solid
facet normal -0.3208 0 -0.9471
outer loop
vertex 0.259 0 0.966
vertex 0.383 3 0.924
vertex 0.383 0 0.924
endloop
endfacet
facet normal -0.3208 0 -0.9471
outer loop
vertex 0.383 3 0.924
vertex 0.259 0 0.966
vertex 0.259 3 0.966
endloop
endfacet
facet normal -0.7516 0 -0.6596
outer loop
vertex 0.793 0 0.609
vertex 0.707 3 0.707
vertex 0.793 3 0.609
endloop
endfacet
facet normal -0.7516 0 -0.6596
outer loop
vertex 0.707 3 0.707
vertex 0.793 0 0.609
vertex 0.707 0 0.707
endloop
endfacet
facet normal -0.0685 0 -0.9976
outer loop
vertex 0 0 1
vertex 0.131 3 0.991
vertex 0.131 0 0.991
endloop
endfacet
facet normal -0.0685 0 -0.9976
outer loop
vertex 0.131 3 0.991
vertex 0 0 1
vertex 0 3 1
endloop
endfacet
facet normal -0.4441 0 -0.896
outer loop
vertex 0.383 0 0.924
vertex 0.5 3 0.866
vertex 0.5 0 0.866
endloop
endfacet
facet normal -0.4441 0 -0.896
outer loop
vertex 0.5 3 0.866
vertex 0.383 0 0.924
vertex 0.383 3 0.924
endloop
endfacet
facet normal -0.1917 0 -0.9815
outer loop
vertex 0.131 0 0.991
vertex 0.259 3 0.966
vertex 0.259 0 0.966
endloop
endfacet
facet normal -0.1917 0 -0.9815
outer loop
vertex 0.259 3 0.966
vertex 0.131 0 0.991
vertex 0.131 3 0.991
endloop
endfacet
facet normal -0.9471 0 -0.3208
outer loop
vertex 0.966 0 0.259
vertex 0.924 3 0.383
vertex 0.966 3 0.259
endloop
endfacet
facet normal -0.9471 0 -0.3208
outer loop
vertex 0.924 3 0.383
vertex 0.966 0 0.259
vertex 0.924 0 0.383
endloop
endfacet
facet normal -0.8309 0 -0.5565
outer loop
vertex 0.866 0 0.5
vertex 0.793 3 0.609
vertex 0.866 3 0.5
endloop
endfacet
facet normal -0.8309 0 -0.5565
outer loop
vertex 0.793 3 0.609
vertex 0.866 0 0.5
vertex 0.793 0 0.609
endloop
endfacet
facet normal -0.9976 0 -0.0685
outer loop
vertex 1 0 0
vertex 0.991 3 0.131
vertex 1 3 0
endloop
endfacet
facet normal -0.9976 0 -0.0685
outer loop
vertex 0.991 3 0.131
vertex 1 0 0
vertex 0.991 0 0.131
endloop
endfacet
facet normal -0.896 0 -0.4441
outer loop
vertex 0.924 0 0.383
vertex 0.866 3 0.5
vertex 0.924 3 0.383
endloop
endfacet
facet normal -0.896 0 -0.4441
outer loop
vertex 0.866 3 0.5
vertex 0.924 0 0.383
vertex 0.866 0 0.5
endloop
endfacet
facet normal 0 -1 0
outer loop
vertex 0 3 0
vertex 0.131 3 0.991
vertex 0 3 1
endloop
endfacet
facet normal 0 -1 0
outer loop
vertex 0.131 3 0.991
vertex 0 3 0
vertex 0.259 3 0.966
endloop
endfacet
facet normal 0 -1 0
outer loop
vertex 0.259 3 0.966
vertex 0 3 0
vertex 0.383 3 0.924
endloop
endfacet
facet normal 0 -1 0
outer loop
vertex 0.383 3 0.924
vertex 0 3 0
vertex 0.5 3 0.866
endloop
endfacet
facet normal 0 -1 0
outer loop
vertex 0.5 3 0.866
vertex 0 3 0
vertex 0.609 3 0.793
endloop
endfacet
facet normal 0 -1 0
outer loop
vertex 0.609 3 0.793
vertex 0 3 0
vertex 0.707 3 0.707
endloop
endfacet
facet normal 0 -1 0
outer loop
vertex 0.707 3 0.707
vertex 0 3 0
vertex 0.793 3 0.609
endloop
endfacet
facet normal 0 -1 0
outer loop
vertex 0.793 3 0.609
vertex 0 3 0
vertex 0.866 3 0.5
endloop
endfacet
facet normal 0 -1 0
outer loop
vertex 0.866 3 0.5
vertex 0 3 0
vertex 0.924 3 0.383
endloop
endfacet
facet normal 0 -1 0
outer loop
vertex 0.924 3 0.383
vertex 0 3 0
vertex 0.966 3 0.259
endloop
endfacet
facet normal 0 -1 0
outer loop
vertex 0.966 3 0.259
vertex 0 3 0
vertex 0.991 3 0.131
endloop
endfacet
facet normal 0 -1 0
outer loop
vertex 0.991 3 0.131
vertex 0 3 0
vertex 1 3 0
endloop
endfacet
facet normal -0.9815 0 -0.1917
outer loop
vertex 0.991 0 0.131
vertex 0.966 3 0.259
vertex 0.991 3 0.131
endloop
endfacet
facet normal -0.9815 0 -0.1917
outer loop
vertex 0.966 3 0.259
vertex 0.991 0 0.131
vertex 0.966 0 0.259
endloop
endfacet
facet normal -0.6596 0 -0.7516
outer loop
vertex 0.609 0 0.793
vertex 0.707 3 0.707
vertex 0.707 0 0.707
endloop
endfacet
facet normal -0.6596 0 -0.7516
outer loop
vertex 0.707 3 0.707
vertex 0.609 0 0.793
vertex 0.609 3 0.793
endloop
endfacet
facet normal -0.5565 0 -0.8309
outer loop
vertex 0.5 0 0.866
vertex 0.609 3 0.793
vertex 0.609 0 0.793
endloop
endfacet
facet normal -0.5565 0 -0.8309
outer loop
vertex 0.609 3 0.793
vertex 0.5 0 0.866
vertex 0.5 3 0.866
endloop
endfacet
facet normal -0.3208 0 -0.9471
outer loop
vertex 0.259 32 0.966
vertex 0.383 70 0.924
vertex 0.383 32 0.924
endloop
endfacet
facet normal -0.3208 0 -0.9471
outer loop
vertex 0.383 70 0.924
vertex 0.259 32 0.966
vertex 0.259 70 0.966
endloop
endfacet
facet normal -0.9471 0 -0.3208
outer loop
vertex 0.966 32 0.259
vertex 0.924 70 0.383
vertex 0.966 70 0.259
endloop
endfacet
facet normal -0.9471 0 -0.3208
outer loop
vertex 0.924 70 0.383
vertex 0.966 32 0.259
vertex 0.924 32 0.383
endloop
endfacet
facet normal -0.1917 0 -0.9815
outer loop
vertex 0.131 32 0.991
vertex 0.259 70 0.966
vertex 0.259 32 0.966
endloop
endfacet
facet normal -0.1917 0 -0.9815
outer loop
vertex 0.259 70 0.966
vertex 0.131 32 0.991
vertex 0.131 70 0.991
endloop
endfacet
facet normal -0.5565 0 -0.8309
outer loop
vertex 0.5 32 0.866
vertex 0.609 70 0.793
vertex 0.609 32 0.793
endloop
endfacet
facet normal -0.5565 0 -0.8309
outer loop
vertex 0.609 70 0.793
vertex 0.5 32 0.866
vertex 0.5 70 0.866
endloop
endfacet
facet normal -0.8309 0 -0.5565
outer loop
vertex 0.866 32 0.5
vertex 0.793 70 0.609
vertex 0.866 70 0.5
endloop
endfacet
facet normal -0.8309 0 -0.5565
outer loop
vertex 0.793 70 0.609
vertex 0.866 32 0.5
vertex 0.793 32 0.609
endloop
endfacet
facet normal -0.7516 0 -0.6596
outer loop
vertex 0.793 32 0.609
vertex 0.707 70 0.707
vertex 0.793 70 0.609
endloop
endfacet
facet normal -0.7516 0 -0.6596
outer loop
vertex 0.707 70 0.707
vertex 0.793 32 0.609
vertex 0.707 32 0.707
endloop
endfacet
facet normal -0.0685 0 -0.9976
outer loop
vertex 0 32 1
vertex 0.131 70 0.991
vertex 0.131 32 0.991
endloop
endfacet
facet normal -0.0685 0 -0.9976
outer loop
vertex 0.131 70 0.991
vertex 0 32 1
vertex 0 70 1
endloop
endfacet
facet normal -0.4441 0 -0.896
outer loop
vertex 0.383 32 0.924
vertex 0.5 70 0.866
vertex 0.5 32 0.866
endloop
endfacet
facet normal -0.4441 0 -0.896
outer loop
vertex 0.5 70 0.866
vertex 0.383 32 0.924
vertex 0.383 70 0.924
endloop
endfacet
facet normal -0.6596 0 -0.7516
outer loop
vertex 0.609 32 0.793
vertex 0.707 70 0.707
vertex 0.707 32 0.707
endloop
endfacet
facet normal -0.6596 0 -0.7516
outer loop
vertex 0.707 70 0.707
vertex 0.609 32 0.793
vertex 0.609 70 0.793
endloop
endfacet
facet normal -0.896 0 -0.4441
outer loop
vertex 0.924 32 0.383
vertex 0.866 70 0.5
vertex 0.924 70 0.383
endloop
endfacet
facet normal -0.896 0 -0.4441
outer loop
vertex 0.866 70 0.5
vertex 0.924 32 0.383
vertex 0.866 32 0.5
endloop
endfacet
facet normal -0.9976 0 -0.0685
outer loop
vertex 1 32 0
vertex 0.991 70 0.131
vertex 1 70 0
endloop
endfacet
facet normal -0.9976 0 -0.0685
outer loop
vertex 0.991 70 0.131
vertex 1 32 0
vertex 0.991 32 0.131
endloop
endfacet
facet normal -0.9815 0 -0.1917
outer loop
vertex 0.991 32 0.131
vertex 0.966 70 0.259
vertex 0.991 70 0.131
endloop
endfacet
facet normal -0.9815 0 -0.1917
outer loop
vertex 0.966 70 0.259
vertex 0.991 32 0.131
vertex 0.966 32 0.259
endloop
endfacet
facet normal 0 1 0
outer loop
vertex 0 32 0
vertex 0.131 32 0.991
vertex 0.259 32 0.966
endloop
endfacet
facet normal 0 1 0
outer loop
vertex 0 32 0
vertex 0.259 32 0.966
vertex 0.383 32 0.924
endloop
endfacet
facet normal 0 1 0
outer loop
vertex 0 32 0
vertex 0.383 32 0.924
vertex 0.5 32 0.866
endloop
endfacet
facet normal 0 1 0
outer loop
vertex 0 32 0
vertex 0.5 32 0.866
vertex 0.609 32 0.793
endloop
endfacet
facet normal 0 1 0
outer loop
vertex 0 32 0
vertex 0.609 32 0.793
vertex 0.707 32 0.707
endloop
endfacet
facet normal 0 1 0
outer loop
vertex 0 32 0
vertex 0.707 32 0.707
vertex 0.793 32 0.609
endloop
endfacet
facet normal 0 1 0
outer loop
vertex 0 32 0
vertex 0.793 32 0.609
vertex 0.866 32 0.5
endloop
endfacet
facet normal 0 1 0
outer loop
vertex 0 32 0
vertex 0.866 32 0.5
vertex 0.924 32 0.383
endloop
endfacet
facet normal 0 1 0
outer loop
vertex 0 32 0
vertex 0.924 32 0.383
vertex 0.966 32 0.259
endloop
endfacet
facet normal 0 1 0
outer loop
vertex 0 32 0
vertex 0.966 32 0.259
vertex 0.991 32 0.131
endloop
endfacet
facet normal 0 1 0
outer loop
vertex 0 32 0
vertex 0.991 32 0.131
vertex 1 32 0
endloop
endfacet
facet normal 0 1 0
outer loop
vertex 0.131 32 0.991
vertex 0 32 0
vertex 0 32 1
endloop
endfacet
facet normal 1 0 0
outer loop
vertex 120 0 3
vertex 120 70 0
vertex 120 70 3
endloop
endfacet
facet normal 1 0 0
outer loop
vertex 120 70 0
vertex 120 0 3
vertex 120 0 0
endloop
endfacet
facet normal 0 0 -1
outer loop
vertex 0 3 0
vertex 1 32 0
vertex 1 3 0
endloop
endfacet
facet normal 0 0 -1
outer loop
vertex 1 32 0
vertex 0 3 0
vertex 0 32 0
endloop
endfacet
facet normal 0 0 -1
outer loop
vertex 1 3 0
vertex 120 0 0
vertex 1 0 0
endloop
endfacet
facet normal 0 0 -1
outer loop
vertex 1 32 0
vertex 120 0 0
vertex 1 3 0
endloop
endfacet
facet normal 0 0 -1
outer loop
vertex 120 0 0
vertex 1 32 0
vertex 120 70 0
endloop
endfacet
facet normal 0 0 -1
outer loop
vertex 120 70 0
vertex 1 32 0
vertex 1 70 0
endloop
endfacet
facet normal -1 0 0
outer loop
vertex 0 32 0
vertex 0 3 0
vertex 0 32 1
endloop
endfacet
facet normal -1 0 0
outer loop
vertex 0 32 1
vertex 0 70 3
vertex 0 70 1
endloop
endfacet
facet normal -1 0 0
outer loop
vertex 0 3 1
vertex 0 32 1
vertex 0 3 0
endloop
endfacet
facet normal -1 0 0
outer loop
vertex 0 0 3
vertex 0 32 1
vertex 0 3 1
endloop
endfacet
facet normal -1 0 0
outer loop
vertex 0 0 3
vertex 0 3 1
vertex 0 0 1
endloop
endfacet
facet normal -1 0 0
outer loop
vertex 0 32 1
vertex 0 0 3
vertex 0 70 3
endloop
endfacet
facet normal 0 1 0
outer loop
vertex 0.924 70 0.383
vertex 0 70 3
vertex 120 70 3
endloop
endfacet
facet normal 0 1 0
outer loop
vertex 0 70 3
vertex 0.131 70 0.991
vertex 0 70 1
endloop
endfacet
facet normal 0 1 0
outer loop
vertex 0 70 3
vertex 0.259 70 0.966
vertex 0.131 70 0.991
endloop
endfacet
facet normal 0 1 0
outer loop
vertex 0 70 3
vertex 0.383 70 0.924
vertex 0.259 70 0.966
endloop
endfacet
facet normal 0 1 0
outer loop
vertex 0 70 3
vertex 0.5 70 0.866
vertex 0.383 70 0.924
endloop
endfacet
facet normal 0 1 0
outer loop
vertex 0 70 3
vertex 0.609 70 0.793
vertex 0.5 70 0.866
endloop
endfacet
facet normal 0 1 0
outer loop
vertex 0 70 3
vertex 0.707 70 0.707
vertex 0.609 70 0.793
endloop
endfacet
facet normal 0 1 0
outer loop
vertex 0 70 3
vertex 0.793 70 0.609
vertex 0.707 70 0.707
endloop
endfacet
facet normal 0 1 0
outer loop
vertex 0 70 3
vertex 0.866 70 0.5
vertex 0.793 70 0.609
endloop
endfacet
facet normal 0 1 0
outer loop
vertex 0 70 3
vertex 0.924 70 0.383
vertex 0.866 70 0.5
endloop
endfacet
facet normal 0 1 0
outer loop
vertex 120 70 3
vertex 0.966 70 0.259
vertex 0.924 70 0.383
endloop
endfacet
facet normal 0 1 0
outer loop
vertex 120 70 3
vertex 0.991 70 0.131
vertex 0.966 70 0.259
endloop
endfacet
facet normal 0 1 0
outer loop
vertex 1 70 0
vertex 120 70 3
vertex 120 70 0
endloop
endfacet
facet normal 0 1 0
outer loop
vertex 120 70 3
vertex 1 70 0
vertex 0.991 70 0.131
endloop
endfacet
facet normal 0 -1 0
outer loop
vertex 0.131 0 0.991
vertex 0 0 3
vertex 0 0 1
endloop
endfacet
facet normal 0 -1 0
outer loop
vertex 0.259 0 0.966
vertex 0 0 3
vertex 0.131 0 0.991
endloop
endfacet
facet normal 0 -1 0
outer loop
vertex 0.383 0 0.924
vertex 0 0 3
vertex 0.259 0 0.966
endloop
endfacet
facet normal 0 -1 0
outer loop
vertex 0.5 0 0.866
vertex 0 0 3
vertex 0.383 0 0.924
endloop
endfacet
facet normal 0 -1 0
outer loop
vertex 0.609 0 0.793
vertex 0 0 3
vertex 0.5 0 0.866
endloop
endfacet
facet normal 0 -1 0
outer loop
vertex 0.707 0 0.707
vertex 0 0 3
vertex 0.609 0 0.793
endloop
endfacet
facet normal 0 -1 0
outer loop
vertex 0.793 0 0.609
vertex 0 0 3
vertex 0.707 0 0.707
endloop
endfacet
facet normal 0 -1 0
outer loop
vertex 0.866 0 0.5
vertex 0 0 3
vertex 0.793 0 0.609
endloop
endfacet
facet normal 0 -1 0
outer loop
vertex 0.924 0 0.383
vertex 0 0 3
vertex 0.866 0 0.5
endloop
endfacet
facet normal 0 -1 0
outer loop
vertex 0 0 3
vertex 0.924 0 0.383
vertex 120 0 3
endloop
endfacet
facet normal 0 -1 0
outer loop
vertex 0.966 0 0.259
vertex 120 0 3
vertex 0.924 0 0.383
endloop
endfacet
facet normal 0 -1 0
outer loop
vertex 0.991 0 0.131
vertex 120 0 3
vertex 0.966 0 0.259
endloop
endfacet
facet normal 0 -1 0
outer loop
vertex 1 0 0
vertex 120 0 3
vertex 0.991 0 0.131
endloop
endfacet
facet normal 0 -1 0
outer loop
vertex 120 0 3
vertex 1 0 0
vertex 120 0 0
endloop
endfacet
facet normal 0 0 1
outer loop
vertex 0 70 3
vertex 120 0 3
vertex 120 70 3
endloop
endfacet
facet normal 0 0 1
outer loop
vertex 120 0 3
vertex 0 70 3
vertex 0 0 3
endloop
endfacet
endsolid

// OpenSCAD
// Open-top rectangular buffer tank for a mini horizontal gel-electrophoresis box. NOVEL general part.
//

tank_L = 120;
tank_W = 70;
tank_H = 40;
wall   = 3;
floor  = 3;

$fn = 48;

inner_L = tank_L - 2 * wall;
inner_W = tank_W - 2 * wall;
inner_H = tank_H - floor;

platform_x = 60;
platform_t = 10;

difference() {
    cube([tank_L, tank_W, tank_H]);
    translate([0, 0, floor]) cube([tank_L, tank_W, tank_H - floor]);       // hollow, open top
    translate([-(tank_L / 2 - platform_x / 2), 0, floor + wall])
        cube([platform_x, tank_W, platform_t]);                           // central raised platform
    for (y = [-1, 1])
        translate([0, y * tank_W / 2 - wall, 0])
            rotate([-90, 0, 0]) cylinder(h = tank_H + 1, d = 2);          // electrode holes (X-directed)
}
